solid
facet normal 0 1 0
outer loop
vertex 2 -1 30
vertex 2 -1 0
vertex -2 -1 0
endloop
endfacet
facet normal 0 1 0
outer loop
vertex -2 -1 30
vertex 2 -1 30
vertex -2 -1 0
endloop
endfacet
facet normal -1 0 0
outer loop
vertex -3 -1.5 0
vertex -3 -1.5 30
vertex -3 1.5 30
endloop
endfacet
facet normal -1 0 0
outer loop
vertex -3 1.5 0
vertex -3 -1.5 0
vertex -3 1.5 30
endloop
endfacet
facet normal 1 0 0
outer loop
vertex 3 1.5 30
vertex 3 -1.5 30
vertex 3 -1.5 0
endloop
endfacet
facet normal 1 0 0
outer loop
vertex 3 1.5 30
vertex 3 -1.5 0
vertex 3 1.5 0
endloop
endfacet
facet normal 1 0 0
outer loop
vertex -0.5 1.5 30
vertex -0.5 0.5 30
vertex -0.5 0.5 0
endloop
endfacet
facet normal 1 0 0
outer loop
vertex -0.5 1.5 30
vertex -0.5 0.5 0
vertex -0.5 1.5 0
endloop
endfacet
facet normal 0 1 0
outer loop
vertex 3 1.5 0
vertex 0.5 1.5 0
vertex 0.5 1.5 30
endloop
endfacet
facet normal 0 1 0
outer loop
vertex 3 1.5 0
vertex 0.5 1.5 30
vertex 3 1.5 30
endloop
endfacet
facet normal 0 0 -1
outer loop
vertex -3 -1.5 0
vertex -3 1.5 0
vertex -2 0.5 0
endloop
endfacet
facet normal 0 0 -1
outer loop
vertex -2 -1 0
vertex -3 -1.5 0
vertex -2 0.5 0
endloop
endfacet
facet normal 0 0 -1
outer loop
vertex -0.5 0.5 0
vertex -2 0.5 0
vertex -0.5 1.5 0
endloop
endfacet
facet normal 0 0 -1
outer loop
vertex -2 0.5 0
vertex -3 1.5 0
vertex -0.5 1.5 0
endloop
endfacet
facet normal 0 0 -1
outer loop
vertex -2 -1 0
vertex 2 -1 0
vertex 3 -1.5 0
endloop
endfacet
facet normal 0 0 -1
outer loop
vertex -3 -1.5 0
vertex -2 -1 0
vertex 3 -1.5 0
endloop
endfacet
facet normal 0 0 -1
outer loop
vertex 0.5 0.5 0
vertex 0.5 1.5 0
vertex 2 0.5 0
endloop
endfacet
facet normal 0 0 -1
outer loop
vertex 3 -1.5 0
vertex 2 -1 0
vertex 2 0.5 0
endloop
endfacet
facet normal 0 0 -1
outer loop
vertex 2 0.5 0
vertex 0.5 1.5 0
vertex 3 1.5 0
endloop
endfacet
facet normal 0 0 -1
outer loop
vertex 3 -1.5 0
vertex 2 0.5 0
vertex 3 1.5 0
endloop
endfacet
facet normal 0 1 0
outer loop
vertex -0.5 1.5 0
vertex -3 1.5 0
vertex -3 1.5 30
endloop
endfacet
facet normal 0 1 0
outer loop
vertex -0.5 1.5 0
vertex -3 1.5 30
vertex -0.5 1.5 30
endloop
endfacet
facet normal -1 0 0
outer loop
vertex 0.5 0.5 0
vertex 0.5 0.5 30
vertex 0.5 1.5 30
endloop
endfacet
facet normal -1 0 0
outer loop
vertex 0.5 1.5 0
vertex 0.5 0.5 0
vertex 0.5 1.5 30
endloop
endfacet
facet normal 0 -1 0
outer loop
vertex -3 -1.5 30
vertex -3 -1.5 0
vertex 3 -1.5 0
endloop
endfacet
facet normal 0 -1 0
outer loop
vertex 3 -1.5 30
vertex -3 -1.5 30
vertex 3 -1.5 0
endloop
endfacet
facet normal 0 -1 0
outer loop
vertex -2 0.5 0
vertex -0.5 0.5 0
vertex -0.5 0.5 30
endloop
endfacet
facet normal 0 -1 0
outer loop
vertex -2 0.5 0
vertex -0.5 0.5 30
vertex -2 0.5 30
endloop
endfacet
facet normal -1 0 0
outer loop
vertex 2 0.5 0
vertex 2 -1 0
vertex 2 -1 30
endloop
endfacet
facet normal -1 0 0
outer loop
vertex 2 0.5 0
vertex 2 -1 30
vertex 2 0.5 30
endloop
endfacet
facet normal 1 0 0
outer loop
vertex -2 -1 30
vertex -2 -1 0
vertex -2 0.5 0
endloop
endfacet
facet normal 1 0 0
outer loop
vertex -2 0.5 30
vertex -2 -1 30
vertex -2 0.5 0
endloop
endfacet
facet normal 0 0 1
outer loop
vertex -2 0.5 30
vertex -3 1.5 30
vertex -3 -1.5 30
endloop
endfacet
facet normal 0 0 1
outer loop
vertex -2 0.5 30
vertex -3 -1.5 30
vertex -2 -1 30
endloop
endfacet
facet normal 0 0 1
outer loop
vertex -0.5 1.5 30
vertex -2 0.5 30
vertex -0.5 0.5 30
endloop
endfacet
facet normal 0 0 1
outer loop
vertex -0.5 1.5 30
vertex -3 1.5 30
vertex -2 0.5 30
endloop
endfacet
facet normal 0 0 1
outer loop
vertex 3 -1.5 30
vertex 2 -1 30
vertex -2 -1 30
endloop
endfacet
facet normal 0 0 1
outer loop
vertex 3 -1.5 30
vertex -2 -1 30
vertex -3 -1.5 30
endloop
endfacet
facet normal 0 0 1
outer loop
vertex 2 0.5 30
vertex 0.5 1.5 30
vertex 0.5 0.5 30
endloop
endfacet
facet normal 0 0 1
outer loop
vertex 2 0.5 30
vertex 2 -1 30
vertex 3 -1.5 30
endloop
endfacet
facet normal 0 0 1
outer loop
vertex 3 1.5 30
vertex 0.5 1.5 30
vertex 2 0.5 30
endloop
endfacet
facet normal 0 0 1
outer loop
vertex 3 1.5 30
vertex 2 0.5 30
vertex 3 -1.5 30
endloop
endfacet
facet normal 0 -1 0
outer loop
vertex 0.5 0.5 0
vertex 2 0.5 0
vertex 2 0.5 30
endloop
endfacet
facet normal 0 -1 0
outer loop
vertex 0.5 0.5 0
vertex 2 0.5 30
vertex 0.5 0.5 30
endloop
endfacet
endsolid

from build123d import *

# Parameters (mm, degrees)
SKETCH_1_W          = 6
SKETCH_1_H          = 3
EXTRUDE_1_DEPTH     = 30
SKETCH_2_W          = 1
SKETCH_2_H          = 1.018441017
CUT_EXTRUDE_2_DEPTH = 30
SKETCH_5_W          = 4
SKETCH_5_H          = 1.5
CUT_EXTRUDE_5_DEPTH = 30


with BuildPart() as part:
    # 草圖1 → 填料-伸長1 (new body)
    with BuildSketch(Plane.XY):
        Rectangle(SKETCH_1_W, SKETCH_1_H)
    extrude(amount=EXTRUDE_1_DEPTH)

    # 草圖2 → 除料-伸長2 (cut)
    with BuildSketch(Plane(origin=(0, 0, 0), x_dir=(-1, 0, 0), z_dir=(0, 0, -1))):
        with Locations((0, 0.990779491)):
            Rectangle(SKETCH_2_W, SKETCH_2_H)
    extrude(amount=-CUT_EXTRUDE_2_DEPTH, mode=Mode.SUBTRACT)

    # 草圖5 → 除料-伸長5 (cut)
    with BuildSketch(Plane(origin=(0, 0, 0), x_dir=(-1, 0, 0), z_dir=(0, 0, -1))):
        with Locations((0, -0.25)):
            Rectangle(SKETCH_5_W, SKETCH_5_H)
    extrude(amount=-CUT_EXTRUDE_5_DEPTH, mode=Mode.SUBTRACT)


solid = part.part
